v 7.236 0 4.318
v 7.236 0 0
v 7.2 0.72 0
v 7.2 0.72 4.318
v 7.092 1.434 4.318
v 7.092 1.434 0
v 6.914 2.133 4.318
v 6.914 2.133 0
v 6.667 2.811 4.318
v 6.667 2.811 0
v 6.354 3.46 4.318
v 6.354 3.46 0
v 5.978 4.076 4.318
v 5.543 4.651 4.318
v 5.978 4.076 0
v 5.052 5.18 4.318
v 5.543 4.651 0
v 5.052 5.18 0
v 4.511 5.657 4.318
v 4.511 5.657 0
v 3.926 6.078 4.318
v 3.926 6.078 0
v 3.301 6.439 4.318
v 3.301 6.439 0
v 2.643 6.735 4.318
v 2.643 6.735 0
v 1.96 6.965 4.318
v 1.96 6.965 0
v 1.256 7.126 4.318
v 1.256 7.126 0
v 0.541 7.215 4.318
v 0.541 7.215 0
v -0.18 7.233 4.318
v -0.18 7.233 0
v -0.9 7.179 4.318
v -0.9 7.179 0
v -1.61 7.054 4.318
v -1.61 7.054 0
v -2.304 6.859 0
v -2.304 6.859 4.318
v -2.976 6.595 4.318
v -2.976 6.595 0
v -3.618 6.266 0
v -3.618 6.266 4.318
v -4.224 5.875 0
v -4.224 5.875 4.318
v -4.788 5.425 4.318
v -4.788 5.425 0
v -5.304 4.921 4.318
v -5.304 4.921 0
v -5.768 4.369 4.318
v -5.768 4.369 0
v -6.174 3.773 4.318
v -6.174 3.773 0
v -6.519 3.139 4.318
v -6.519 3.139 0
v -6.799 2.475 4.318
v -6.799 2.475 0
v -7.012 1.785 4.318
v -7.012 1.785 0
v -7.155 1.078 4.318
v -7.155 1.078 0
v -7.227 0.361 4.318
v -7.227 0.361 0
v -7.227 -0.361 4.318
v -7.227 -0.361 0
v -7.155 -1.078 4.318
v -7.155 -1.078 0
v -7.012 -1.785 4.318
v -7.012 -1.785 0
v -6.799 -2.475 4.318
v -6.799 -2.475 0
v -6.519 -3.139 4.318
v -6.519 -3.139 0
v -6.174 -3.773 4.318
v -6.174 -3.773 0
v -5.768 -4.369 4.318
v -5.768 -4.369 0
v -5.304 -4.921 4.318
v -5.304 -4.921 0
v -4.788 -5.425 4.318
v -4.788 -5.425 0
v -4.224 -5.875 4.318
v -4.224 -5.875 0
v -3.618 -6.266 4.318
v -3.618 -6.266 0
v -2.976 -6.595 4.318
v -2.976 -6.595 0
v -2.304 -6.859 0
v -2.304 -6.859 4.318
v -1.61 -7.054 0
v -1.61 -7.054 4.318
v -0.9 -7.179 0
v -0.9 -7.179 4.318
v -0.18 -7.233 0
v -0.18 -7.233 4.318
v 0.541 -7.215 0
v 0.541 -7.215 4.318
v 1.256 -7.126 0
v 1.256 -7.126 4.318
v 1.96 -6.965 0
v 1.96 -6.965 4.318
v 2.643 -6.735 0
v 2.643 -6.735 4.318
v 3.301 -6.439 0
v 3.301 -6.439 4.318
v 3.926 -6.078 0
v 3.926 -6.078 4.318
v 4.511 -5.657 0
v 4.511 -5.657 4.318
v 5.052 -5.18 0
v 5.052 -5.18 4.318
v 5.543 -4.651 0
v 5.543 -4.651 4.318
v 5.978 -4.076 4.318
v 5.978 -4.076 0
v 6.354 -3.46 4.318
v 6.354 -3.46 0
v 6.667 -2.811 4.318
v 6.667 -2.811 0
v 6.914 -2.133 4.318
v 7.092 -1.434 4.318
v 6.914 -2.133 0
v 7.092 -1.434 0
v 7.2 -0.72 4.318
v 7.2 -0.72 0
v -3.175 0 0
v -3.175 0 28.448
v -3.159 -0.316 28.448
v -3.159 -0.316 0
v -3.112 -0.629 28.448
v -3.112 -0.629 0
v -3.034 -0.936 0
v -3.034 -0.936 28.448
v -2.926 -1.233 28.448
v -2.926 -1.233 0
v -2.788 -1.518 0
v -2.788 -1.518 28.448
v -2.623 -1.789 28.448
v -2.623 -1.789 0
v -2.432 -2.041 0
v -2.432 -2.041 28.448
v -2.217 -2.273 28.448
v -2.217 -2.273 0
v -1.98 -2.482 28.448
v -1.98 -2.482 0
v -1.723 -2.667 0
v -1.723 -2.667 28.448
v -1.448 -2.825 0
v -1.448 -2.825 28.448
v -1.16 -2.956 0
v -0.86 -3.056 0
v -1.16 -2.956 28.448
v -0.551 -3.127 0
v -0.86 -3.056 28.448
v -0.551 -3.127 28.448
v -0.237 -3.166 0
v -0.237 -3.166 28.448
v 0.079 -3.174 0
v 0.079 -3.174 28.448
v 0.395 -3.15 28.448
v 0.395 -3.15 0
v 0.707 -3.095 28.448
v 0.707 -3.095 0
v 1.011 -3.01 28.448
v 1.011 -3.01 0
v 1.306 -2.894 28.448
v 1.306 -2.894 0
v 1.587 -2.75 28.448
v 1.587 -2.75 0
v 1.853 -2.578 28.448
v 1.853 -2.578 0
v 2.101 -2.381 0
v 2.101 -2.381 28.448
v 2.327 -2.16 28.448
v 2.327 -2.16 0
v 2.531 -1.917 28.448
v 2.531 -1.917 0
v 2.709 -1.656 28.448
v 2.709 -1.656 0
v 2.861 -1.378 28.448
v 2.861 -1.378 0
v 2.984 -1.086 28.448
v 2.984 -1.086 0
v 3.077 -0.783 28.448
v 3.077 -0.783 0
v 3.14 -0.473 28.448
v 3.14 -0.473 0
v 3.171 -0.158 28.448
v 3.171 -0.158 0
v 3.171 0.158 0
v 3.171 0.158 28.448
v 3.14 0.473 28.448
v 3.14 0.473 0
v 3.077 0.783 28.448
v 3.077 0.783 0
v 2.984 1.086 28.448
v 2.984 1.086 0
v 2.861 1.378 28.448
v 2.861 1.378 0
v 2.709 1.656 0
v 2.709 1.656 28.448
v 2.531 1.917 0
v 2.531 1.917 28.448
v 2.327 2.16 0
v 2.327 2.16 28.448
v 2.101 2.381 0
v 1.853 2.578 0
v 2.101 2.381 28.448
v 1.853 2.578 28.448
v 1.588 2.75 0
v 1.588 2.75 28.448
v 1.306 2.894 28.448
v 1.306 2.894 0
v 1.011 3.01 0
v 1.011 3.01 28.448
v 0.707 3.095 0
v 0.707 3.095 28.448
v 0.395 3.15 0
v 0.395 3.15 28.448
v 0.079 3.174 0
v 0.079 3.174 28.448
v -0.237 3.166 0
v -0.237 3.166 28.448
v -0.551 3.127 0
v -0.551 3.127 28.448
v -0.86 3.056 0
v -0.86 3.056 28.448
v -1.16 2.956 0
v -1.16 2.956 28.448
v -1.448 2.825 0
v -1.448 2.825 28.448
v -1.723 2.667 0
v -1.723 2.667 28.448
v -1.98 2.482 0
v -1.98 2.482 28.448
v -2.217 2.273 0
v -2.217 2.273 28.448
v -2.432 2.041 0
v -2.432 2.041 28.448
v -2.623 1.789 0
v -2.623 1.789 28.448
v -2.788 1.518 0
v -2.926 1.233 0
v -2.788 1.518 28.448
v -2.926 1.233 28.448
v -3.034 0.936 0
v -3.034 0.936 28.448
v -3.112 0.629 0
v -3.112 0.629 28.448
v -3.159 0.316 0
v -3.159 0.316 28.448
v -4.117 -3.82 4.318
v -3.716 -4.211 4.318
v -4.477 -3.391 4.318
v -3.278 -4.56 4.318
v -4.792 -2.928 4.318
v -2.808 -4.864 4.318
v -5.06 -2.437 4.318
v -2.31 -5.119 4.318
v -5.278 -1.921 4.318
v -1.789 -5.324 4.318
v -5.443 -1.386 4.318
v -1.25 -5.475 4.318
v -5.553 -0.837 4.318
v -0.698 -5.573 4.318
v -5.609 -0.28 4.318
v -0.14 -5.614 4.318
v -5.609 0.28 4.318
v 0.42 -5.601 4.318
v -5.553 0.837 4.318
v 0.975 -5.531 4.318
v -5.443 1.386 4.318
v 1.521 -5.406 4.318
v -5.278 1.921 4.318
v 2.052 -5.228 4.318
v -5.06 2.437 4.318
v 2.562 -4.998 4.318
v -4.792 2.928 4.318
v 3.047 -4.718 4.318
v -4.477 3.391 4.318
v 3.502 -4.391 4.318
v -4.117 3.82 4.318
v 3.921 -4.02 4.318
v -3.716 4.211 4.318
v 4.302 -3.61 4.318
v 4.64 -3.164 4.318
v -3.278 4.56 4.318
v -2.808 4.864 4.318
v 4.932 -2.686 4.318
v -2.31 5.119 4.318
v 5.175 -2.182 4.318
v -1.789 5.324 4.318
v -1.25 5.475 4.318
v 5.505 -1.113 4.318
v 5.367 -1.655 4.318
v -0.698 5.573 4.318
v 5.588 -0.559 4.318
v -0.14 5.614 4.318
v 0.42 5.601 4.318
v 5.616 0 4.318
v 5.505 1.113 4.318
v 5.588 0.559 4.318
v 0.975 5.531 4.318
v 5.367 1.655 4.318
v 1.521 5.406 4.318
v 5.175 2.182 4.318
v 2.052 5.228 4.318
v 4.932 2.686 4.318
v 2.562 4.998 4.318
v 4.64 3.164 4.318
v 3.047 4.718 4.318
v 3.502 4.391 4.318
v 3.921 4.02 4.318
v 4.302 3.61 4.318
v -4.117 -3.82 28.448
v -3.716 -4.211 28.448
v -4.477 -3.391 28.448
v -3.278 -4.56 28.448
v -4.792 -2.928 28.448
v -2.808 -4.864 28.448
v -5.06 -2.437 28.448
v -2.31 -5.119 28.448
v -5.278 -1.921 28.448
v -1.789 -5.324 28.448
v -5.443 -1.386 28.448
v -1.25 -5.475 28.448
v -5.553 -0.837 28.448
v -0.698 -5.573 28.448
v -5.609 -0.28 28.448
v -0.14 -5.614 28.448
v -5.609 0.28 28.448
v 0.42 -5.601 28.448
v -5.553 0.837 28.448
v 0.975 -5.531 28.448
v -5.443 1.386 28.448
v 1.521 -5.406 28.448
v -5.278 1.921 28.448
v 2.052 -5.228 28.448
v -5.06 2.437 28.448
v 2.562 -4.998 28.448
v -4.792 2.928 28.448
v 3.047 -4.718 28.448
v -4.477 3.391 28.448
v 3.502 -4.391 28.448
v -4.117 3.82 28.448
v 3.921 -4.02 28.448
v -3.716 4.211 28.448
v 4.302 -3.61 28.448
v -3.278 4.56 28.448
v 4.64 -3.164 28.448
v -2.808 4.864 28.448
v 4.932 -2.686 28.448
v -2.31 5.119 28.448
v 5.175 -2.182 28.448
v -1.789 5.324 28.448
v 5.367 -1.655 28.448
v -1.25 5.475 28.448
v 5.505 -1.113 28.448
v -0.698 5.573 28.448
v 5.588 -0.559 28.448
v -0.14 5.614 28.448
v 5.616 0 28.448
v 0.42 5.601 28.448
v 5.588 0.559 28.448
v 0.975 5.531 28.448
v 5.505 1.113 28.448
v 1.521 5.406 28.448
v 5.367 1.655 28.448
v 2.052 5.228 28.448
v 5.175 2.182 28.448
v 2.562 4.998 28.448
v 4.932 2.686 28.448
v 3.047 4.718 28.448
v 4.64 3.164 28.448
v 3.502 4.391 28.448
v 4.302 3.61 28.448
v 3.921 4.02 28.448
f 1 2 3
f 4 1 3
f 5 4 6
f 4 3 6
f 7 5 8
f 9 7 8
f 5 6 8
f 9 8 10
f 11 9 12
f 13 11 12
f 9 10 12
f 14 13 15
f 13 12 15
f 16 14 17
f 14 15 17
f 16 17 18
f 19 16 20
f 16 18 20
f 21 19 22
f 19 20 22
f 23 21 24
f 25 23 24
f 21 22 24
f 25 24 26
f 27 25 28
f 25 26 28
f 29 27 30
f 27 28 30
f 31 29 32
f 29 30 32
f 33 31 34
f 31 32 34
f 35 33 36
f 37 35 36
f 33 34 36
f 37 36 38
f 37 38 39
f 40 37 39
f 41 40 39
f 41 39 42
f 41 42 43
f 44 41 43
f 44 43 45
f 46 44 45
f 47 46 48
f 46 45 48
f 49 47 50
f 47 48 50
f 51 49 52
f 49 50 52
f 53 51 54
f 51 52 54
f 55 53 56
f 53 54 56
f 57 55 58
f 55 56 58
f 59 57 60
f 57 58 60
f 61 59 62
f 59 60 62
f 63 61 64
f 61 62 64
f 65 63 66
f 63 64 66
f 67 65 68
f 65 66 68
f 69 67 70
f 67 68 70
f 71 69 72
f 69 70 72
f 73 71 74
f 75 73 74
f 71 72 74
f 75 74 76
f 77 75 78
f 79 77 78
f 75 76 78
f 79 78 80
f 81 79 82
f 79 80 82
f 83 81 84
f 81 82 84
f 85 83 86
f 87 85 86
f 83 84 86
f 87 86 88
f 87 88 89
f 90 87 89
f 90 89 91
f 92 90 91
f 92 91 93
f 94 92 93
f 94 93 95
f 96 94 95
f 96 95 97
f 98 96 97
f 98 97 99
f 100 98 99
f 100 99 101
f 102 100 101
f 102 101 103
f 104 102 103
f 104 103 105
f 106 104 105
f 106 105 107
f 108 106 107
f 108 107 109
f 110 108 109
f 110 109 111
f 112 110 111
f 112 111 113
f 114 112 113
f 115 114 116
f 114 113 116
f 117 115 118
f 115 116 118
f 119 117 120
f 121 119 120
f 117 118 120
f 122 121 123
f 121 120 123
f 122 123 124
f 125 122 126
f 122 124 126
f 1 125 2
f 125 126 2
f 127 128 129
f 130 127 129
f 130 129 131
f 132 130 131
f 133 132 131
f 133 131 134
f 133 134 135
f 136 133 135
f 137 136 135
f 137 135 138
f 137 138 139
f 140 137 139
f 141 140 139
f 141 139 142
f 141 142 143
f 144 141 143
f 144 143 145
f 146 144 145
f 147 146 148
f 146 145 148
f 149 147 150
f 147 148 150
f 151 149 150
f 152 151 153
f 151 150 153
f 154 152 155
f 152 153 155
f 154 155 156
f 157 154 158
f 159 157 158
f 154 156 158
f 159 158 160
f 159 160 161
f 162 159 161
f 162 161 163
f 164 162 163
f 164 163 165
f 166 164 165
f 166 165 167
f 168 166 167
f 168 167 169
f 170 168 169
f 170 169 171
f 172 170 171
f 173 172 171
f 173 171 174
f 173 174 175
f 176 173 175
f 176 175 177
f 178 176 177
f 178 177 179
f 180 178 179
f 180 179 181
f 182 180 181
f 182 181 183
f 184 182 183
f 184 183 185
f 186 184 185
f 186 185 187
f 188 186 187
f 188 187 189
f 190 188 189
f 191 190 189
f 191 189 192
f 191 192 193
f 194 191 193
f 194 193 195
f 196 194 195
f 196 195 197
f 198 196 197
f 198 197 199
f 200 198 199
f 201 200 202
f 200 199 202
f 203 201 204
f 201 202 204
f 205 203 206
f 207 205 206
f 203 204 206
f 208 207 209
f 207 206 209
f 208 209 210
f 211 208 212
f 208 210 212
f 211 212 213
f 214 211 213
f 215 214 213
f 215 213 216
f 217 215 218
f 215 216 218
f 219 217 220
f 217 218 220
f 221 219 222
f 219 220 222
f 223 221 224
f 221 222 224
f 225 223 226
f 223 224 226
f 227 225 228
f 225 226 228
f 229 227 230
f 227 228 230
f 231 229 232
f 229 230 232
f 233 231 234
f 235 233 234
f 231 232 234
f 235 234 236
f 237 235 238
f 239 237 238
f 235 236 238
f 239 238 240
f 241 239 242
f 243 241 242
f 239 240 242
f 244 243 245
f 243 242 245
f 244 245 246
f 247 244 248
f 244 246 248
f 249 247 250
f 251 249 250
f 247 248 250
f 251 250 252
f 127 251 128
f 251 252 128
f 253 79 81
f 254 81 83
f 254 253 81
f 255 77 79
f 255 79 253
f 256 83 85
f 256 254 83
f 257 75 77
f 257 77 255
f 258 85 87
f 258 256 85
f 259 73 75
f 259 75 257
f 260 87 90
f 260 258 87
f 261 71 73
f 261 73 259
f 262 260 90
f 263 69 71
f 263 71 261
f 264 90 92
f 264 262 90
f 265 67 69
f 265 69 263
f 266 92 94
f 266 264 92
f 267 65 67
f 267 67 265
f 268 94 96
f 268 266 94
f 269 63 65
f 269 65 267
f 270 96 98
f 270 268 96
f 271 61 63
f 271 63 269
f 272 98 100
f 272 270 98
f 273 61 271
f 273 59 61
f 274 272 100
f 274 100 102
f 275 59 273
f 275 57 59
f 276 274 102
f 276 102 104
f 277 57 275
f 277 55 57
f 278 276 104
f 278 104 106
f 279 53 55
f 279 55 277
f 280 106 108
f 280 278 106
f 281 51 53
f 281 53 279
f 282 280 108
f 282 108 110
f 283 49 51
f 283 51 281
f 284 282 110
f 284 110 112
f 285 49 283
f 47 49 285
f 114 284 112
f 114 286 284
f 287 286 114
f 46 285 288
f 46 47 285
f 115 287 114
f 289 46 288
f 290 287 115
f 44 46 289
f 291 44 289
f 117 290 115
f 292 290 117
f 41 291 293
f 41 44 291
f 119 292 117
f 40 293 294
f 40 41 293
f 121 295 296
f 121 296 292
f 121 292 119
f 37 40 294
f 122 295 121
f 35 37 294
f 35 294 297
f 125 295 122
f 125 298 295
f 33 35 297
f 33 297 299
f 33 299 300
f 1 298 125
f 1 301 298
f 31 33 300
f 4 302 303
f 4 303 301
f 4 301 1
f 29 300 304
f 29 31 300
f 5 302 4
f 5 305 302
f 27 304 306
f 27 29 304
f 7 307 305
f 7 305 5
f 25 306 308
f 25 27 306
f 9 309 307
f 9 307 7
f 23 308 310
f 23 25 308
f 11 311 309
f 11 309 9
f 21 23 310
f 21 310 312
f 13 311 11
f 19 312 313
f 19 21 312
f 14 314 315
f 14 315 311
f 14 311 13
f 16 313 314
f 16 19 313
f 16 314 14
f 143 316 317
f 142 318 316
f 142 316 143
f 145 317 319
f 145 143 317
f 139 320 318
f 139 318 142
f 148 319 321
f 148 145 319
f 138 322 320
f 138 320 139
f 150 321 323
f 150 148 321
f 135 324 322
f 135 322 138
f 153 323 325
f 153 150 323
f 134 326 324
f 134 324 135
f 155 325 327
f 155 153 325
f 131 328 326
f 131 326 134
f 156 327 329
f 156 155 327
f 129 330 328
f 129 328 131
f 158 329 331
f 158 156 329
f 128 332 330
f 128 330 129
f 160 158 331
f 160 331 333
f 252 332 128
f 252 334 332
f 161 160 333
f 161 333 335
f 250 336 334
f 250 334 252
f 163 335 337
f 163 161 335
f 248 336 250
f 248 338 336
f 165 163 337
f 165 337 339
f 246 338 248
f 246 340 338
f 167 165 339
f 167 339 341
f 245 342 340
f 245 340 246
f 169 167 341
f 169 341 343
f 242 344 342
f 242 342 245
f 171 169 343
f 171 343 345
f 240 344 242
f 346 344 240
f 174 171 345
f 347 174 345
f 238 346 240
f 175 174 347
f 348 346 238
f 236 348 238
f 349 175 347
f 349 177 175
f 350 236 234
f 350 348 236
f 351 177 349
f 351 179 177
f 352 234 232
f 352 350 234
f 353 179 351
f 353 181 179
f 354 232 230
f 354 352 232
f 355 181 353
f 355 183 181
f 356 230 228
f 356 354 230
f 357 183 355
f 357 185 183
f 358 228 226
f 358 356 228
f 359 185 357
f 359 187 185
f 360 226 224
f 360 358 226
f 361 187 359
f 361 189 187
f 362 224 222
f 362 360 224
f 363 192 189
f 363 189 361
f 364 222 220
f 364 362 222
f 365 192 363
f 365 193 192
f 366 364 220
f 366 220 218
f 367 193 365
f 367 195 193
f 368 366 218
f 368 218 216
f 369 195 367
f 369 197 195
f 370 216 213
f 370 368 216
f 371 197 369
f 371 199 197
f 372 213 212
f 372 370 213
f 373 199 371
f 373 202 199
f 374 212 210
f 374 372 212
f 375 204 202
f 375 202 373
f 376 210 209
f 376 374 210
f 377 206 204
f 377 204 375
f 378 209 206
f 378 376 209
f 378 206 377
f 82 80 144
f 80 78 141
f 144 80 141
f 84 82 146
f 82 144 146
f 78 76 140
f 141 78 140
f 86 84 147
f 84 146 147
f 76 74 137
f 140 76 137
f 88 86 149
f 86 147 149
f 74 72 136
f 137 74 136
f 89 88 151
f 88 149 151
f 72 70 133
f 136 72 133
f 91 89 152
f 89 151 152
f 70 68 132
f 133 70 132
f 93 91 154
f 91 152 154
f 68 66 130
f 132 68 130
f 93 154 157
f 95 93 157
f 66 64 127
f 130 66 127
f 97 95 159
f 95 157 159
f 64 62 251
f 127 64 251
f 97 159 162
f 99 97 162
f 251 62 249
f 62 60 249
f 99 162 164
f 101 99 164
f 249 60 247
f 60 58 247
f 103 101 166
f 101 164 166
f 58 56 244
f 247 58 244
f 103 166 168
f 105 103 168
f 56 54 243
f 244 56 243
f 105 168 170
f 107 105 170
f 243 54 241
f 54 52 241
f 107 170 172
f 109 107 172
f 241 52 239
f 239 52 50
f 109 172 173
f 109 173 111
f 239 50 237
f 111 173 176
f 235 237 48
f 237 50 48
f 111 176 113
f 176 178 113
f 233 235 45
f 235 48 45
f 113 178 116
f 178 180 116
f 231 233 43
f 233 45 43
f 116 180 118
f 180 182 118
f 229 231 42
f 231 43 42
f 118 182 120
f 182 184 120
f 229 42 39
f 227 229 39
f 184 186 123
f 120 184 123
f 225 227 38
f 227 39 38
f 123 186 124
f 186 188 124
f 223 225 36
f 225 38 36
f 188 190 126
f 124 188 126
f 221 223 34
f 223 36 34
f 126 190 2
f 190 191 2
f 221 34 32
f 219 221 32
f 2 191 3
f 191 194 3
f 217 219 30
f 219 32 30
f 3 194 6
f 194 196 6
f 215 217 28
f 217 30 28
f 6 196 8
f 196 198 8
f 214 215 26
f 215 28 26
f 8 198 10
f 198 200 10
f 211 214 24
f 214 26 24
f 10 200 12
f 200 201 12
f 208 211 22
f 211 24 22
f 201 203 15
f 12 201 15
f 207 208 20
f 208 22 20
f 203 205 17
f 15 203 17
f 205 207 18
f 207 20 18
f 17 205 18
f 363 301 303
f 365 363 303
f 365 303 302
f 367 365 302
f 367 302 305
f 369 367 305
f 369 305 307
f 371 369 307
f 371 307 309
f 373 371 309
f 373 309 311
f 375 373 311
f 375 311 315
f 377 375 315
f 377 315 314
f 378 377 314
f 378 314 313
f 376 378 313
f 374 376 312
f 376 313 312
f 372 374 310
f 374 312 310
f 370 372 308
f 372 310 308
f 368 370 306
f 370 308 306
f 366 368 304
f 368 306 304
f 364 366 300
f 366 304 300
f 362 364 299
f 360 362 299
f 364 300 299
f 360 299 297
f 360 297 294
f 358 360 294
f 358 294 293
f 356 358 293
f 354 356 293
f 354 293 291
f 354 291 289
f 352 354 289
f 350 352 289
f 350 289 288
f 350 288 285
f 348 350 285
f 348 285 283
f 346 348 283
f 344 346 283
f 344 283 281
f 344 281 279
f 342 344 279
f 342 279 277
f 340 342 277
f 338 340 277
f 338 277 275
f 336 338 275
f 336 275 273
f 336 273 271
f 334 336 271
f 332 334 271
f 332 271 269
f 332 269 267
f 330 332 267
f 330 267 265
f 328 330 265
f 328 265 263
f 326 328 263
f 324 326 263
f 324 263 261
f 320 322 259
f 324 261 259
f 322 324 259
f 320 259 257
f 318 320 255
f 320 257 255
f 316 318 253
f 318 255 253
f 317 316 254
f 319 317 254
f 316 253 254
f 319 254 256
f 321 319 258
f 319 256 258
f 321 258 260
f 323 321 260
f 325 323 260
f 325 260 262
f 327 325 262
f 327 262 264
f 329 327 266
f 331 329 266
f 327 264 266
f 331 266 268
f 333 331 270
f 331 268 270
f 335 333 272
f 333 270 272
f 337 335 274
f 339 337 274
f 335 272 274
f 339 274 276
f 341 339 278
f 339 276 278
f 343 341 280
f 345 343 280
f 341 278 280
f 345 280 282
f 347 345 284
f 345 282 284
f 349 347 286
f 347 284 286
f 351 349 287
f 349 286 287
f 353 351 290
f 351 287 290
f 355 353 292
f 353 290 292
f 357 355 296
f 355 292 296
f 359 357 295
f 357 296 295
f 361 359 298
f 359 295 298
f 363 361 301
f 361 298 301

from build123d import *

# Parameters (mm, degrees)
F0_R     = 5.616207
F1_DEPTH = 28.448
F2_R     = 7.235585
F3_DEPTH = 4.318
F5_D     = 6.35


with BuildPart() as f1:
    # F0 (on Top) → F1 (new body)
    with BuildSketch(Plane.XY):
        Circle(F0_R)
    extrude(amount=F1_DEPTH)

    # F2 (on Top) → F3 (join)
    with BuildSketch(Plane.XY):
        Circle(F2_R)
    extrude(amount=F3_DEPTH)

    # F5 (through all)
    with Locations(Plane(origin=(0, 0, 0), x_dir=(1, 0, 0), z_dir=(0, 0, -1))):
        with Locations((0, 0)):
            Hole(F5_D / 2)


solid = f1.part
